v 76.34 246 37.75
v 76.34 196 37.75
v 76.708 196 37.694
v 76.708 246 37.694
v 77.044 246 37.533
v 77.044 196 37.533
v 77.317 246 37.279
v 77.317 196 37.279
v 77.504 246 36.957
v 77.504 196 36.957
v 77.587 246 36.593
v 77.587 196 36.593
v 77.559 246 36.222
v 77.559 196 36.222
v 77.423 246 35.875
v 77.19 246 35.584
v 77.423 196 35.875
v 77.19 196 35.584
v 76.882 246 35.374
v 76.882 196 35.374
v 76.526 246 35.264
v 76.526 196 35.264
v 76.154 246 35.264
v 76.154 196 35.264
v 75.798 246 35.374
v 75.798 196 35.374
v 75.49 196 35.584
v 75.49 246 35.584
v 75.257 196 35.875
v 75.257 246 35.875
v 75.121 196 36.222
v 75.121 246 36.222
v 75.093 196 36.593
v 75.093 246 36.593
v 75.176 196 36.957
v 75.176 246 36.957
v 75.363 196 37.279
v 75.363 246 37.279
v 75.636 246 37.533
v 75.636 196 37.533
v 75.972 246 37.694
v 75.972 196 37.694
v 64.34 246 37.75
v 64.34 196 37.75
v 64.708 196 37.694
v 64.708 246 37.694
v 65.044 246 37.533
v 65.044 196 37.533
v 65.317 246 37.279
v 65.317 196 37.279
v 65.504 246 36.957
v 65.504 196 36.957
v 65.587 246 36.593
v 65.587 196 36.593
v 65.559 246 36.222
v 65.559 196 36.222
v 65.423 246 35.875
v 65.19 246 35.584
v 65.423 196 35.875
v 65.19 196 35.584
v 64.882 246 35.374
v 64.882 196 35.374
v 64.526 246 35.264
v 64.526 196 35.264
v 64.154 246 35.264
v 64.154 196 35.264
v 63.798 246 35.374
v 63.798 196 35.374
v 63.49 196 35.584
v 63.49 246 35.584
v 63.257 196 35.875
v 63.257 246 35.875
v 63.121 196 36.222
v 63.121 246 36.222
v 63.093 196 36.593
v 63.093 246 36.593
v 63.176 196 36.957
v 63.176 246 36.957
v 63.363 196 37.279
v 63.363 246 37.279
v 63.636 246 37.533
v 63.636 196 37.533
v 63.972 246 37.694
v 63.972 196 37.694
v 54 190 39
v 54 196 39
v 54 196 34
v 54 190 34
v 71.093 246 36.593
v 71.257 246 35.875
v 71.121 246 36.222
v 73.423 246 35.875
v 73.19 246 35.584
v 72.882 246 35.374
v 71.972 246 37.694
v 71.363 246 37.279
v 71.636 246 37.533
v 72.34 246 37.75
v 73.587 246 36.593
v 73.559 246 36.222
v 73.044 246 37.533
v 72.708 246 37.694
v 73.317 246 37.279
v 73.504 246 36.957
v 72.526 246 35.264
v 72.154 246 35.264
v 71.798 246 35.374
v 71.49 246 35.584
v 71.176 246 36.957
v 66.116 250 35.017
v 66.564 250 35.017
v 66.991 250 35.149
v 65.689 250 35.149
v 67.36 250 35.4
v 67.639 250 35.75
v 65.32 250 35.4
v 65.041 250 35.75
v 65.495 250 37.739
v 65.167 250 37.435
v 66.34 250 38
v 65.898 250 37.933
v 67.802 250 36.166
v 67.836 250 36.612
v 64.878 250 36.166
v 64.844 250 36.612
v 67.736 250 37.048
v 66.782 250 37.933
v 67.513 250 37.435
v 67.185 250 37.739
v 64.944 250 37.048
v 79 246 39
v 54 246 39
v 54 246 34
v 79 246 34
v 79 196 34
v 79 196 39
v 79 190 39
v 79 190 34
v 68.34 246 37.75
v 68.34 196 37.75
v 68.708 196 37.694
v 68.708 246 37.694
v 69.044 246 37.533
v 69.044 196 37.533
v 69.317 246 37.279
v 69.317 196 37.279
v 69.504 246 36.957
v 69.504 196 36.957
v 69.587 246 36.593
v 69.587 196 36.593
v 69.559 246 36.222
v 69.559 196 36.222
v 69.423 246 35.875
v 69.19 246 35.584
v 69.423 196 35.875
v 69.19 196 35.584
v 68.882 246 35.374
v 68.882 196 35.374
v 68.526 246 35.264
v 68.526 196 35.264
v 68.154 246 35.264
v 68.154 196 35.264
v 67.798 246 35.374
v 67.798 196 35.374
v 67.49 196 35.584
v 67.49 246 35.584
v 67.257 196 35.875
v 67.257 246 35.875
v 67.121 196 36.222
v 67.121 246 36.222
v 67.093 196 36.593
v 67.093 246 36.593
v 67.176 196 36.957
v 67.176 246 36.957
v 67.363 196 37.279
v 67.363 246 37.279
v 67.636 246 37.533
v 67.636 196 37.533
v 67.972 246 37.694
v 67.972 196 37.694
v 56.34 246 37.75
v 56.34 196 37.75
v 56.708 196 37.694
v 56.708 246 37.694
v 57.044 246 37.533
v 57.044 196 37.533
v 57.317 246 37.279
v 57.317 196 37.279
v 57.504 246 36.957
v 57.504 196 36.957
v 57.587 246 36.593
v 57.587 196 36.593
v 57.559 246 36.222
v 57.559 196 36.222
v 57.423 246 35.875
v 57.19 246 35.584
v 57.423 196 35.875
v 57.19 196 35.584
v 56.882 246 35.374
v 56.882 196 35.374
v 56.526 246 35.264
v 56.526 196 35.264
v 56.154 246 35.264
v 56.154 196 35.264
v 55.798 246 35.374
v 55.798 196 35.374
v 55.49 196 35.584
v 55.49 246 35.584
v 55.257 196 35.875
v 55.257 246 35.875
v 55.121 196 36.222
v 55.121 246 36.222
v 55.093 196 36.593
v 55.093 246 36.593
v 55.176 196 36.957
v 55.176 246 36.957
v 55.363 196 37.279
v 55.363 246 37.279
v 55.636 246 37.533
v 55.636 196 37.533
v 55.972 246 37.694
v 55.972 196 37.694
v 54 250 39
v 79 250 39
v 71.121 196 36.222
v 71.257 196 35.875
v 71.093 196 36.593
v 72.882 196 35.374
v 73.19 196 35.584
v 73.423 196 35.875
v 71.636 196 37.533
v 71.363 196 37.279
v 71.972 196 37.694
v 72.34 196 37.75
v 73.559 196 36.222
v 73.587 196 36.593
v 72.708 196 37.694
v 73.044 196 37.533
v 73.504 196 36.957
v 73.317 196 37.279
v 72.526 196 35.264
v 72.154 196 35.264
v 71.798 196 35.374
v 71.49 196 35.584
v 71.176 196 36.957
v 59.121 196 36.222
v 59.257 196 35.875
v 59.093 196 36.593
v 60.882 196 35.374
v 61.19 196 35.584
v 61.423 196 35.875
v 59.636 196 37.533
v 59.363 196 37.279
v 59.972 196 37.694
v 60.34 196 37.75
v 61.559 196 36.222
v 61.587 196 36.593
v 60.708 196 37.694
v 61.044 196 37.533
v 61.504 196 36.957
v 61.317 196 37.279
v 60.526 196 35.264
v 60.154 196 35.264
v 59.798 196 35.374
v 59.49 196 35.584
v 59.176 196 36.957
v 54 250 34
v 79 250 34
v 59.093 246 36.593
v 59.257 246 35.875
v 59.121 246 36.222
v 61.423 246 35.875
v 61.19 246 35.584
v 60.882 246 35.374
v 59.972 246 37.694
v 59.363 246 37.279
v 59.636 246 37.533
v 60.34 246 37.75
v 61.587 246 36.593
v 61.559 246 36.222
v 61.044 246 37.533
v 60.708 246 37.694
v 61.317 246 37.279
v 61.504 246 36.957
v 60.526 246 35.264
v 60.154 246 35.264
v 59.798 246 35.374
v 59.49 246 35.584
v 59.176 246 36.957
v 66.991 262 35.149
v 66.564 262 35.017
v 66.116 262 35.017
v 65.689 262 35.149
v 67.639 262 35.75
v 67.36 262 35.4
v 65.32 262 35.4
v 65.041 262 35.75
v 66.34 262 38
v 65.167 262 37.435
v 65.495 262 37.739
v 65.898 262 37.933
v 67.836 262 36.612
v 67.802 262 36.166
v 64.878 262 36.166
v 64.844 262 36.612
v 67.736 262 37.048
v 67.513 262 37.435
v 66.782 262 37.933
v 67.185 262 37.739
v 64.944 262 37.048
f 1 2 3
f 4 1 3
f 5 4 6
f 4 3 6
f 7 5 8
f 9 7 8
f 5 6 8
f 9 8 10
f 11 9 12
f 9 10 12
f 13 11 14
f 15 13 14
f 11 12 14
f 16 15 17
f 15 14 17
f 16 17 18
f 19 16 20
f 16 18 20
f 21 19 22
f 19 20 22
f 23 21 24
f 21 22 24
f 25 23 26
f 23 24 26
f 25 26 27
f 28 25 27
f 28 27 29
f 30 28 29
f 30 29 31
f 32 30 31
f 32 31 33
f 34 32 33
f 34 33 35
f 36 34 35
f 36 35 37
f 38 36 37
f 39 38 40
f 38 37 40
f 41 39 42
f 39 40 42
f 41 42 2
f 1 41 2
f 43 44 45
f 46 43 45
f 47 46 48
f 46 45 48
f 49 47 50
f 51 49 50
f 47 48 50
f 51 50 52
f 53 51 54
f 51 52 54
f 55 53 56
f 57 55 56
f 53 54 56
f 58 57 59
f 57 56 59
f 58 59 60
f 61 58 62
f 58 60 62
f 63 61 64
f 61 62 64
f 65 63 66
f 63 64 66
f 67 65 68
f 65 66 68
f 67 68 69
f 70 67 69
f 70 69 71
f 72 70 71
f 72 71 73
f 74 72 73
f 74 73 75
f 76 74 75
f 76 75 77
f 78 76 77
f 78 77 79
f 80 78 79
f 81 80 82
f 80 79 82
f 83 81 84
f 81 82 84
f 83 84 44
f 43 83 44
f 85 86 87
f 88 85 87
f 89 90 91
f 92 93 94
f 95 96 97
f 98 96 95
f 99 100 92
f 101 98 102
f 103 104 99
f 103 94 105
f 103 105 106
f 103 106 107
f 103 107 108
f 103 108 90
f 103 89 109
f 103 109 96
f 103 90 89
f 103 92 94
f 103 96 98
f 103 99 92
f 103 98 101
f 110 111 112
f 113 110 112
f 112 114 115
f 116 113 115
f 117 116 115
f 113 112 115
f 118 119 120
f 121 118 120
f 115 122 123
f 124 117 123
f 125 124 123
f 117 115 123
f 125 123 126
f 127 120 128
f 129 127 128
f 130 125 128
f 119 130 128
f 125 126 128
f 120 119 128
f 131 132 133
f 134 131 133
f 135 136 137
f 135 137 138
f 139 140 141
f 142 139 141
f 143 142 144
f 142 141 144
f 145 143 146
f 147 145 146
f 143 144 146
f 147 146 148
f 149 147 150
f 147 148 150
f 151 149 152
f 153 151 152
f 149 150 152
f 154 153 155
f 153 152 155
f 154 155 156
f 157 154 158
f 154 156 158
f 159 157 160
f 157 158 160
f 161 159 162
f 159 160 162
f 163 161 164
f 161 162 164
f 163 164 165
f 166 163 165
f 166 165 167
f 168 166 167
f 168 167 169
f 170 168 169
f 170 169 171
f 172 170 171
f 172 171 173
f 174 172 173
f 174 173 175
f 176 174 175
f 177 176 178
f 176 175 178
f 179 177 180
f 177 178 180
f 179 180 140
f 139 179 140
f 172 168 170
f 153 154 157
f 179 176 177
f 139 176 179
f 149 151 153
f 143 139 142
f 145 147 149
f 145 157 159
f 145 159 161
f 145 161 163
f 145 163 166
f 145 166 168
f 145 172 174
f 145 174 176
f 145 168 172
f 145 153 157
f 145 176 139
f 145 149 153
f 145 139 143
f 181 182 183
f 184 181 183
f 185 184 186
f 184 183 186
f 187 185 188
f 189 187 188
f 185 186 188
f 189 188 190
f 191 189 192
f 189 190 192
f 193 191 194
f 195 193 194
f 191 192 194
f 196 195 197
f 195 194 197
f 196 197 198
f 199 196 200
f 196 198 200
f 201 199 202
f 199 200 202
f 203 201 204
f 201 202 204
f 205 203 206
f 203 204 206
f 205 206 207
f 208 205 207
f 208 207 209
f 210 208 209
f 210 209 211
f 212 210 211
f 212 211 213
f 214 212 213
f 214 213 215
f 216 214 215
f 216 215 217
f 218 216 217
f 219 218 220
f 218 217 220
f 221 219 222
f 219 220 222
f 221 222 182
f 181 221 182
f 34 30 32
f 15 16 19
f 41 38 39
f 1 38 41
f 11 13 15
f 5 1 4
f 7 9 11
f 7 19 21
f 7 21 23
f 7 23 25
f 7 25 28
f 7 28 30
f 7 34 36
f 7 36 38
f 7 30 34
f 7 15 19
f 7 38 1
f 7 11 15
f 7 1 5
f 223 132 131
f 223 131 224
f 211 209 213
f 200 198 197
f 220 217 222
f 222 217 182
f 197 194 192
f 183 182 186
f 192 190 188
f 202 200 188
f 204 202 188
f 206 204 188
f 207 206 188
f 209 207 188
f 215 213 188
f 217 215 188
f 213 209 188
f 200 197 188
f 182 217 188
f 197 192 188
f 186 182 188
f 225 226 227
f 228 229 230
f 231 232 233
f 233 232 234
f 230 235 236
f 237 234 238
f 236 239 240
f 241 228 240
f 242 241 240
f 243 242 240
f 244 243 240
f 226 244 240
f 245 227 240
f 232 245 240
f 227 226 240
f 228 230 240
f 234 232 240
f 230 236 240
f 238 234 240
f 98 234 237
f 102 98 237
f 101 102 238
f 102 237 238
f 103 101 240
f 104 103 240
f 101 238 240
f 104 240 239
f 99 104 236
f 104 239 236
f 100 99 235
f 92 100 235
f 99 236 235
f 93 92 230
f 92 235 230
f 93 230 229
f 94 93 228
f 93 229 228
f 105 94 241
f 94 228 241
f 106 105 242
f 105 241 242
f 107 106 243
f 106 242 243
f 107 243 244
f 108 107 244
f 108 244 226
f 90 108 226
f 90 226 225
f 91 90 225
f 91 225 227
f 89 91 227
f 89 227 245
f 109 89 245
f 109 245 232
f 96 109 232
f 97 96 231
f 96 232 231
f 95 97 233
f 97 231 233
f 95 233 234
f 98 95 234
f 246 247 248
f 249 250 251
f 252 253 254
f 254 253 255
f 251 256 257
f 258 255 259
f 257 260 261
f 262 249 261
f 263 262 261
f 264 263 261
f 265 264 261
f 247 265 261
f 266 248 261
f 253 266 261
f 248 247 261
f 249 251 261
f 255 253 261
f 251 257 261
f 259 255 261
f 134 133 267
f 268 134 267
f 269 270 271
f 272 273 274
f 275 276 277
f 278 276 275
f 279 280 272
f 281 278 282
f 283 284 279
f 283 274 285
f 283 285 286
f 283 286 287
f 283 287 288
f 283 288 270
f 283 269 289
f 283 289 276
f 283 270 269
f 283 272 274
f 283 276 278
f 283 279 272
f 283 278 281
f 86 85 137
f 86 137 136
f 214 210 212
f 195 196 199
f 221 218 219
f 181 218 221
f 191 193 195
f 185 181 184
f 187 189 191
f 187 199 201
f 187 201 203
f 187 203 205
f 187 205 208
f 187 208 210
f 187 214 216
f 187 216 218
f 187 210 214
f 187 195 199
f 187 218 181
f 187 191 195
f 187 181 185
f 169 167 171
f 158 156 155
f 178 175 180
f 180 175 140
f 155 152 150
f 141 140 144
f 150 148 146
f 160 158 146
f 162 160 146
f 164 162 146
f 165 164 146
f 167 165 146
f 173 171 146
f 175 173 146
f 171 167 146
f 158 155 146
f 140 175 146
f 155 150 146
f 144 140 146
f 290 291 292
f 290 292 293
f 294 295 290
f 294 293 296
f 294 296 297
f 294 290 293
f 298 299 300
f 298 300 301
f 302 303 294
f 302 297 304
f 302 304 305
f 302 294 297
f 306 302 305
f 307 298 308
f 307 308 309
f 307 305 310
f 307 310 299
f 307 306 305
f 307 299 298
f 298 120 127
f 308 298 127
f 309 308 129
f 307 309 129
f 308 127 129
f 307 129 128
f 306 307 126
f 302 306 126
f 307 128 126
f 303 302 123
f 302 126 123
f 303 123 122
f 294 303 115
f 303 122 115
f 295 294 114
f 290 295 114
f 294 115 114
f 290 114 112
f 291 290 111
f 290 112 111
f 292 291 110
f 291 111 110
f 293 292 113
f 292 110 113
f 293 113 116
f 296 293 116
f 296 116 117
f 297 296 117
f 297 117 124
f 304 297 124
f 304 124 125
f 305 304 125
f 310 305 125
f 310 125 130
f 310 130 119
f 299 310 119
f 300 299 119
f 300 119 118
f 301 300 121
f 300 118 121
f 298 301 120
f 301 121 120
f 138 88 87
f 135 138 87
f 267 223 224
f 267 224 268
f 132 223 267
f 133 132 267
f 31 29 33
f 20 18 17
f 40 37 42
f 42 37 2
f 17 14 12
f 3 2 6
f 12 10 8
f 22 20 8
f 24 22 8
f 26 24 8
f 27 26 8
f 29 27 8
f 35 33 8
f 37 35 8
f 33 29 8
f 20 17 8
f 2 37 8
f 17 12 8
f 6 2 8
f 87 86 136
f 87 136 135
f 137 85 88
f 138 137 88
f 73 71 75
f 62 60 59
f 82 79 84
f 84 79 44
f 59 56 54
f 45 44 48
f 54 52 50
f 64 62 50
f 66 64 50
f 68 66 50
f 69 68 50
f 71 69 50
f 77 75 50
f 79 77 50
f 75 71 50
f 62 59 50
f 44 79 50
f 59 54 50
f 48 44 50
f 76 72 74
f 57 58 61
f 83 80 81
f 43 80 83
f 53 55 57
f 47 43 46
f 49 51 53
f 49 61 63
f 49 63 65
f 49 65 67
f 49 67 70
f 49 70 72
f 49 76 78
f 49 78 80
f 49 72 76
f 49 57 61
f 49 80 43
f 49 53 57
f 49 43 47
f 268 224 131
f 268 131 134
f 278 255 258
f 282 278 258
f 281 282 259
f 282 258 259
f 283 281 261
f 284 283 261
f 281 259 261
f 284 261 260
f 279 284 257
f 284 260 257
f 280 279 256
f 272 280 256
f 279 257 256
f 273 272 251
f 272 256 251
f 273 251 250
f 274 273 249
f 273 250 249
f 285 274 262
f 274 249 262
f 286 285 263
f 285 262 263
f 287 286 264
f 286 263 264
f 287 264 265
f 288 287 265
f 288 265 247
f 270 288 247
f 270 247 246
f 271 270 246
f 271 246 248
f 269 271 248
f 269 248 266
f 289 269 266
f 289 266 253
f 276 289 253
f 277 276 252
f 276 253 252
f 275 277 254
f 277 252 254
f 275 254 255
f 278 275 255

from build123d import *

# Parameters (mm, degrees)
CROSSHEAD_START    = 54
SKETCH1_W          = 5
SKETCH1_H          = 6
CROSSHEAD_DEPTH    = 25
SMA_SPRING1_START  = 196
SKETCH2_R          = 1.25
SMA_SPRING1_DEPTH  = 50
SMA_SPRING2_START  = 196
SKETCH3_R          = 1.25
SMA_SPRING2_DEPTH  = 50
SMA_SPRING3_START  = 196
SKETCH4_R          = 1.25
SMA_SPRING3_DEPTH  = 50
SMA_SPRING4_START  = 196
SKETCH5_R          = 1.25
SMA_SPRING4_DEPTH  = 50
SMA_SPRING5_START  = 196
SKETCH6_R          = 1.25
SMA_SPRING5_DEPTH  = 50
SMA_SPRING6_START  = 196
SKETCH7_R          = 1.25
SMA_SPRING6_DEPTH  = 50
ANCHOR_PLATE_START = 54
SKETCH8_W          = 5
SKETCH8_H          = 4
ANCHOR_PLATE_DEPTH = 25
HOOK_START         = 250
SKETCH9_R          = 1.5
HOOK_DEPTH         = 12


with BuildPart() as part:
    # Sketch1 → crosshead (new body)
    with BuildSketch(Plane(origin=(0, 0, 0), x_dir=(0, 0, -1), z_dir=(1, 0, 0)).offset(CROSSHEAD_START)):
        with Locations((-36.5, 193)):
            Rectangle(SKETCH1_W, SKETCH1_H)
    extrude(amount=CROSSHEAD_DEPTH)


with BuildPart() as body_2:
    # Sketch2 → sma_spring1 (new body)
    with BuildSketch(Plane(origin=(0, 0, 0), x_dir=(1, 0, 0), z_dir=(0, 1, 0)).offset(SMA_SPRING1_START)):
        with Locations(Location((56.34, -36.5, 0), (0, 0, 270))):
            Circle(SKETCH2_R)
    extrude(amount=SMA_SPRING1_DEPTH)


with BuildPart() as body_3:
    # Sketch3 → sma_spring2 (new body)
    with BuildSketch(Plane(origin=(0, 0, 0), x_dir=(1, 0, 0), z_dir=(0, 1, 0)).offset(SMA_SPRING2_START)):
        with Locations(Location((60.34, -36.5, 0), (0, 0, 270))):
            Circle(SKETCH3_R)
    extrude(amount=SMA_SPRING2_DEPTH)


with BuildPart() as body_4:
    # Sketch4 → sma_spring3 (new body)
    with BuildSketch(Plane(origin=(0, 0, 0), x_dir=(1, 0, 0), z_dir=(0, 1, 0)).offset(SMA_SPRING3_START)):
        with Locations(Location((64.34, -36.5, 0), (0, 0, 270))):
            Circle(SKETCH4_R)
    extrude(amount=SMA_SPRING3_DEPTH)


with BuildPart() as body_5:
    # Sketch5 → sma_spring4 (new body)
    with BuildSketch(Plane(origin=(0, 0, 0), x_dir=(1, 0, 0), z_dir=(0, 1, 0)).offset(SMA_SPRING4_START)):
        with Locations(Location((68.34, -36.5, 0), (0, 0, 270))):
            Circle(SKETCH5_R)
    extrude(amount=SMA_SPRING4_DEPTH)


with BuildPart() as body_6:
    # Sketch6 → sma_spring5 (new body)
    with BuildSketch(Plane(origin=(0, 0, 0), x_dir=(1, 0, 0), z_dir=(0, 1, 0)).offset(SMA_SPRING5_START)):
        with Locations(Location((72.34, -36.5, 0), (0, 0, 270))):
            Circle(SKETCH6_R)
    extrude(amount=SMA_SPRING5_DEPTH)


with BuildPart() as body_7:
    # Sketch7 → sma_spring6 (new body)
    with BuildSketch(Plane(origin=(0, 0, 0), x_dir=(1, 0, 0), z_dir=(0, 1, 0)).offset(SMA_SPRING6_START)):
        with Locations(Location((76.34, -36.5, 0), (0, 0, 270))):
            Circle(SKETCH7_R)
    extrude(amount=SMA_SPRING6_DEPTH)


with BuildPart() as body_8:
    # Sketch8 → anchor_plate (new body)
    with BuildSketch(Plane(origin=(0, 0, 0), x_dir=(0, 0, -1), z_dir=(1, 0, 0)).offset(ANCHOR_PLATE_START)):
        with Locations((-36.5, 248)):
            Rectangle(SKETCH8_W, SKETCH8_H)
    extrude(amount=ANCHOR_PLATE_DEPTH)


with BuildPart() as body_9:
    # Sketch9 → hook (new body)
    with BuildSketch(Plane(origin=(0, 0, 0), x_dir=(1, 0, 0), z_dir=(0, 1, 0)).offset(HOOK_START)):
        with Locations(Location((66.34, -36.5, 0), (0, 0, 270))):
            Circle(SKETCH9_R)
    extrude(amount=HOOK_DEPTH)


solid = Compound([part.part, body_2.part, body_3.part, body_4.part, body_5.part, body_6.part, body_7.part, body_8.part, body_9.part])
